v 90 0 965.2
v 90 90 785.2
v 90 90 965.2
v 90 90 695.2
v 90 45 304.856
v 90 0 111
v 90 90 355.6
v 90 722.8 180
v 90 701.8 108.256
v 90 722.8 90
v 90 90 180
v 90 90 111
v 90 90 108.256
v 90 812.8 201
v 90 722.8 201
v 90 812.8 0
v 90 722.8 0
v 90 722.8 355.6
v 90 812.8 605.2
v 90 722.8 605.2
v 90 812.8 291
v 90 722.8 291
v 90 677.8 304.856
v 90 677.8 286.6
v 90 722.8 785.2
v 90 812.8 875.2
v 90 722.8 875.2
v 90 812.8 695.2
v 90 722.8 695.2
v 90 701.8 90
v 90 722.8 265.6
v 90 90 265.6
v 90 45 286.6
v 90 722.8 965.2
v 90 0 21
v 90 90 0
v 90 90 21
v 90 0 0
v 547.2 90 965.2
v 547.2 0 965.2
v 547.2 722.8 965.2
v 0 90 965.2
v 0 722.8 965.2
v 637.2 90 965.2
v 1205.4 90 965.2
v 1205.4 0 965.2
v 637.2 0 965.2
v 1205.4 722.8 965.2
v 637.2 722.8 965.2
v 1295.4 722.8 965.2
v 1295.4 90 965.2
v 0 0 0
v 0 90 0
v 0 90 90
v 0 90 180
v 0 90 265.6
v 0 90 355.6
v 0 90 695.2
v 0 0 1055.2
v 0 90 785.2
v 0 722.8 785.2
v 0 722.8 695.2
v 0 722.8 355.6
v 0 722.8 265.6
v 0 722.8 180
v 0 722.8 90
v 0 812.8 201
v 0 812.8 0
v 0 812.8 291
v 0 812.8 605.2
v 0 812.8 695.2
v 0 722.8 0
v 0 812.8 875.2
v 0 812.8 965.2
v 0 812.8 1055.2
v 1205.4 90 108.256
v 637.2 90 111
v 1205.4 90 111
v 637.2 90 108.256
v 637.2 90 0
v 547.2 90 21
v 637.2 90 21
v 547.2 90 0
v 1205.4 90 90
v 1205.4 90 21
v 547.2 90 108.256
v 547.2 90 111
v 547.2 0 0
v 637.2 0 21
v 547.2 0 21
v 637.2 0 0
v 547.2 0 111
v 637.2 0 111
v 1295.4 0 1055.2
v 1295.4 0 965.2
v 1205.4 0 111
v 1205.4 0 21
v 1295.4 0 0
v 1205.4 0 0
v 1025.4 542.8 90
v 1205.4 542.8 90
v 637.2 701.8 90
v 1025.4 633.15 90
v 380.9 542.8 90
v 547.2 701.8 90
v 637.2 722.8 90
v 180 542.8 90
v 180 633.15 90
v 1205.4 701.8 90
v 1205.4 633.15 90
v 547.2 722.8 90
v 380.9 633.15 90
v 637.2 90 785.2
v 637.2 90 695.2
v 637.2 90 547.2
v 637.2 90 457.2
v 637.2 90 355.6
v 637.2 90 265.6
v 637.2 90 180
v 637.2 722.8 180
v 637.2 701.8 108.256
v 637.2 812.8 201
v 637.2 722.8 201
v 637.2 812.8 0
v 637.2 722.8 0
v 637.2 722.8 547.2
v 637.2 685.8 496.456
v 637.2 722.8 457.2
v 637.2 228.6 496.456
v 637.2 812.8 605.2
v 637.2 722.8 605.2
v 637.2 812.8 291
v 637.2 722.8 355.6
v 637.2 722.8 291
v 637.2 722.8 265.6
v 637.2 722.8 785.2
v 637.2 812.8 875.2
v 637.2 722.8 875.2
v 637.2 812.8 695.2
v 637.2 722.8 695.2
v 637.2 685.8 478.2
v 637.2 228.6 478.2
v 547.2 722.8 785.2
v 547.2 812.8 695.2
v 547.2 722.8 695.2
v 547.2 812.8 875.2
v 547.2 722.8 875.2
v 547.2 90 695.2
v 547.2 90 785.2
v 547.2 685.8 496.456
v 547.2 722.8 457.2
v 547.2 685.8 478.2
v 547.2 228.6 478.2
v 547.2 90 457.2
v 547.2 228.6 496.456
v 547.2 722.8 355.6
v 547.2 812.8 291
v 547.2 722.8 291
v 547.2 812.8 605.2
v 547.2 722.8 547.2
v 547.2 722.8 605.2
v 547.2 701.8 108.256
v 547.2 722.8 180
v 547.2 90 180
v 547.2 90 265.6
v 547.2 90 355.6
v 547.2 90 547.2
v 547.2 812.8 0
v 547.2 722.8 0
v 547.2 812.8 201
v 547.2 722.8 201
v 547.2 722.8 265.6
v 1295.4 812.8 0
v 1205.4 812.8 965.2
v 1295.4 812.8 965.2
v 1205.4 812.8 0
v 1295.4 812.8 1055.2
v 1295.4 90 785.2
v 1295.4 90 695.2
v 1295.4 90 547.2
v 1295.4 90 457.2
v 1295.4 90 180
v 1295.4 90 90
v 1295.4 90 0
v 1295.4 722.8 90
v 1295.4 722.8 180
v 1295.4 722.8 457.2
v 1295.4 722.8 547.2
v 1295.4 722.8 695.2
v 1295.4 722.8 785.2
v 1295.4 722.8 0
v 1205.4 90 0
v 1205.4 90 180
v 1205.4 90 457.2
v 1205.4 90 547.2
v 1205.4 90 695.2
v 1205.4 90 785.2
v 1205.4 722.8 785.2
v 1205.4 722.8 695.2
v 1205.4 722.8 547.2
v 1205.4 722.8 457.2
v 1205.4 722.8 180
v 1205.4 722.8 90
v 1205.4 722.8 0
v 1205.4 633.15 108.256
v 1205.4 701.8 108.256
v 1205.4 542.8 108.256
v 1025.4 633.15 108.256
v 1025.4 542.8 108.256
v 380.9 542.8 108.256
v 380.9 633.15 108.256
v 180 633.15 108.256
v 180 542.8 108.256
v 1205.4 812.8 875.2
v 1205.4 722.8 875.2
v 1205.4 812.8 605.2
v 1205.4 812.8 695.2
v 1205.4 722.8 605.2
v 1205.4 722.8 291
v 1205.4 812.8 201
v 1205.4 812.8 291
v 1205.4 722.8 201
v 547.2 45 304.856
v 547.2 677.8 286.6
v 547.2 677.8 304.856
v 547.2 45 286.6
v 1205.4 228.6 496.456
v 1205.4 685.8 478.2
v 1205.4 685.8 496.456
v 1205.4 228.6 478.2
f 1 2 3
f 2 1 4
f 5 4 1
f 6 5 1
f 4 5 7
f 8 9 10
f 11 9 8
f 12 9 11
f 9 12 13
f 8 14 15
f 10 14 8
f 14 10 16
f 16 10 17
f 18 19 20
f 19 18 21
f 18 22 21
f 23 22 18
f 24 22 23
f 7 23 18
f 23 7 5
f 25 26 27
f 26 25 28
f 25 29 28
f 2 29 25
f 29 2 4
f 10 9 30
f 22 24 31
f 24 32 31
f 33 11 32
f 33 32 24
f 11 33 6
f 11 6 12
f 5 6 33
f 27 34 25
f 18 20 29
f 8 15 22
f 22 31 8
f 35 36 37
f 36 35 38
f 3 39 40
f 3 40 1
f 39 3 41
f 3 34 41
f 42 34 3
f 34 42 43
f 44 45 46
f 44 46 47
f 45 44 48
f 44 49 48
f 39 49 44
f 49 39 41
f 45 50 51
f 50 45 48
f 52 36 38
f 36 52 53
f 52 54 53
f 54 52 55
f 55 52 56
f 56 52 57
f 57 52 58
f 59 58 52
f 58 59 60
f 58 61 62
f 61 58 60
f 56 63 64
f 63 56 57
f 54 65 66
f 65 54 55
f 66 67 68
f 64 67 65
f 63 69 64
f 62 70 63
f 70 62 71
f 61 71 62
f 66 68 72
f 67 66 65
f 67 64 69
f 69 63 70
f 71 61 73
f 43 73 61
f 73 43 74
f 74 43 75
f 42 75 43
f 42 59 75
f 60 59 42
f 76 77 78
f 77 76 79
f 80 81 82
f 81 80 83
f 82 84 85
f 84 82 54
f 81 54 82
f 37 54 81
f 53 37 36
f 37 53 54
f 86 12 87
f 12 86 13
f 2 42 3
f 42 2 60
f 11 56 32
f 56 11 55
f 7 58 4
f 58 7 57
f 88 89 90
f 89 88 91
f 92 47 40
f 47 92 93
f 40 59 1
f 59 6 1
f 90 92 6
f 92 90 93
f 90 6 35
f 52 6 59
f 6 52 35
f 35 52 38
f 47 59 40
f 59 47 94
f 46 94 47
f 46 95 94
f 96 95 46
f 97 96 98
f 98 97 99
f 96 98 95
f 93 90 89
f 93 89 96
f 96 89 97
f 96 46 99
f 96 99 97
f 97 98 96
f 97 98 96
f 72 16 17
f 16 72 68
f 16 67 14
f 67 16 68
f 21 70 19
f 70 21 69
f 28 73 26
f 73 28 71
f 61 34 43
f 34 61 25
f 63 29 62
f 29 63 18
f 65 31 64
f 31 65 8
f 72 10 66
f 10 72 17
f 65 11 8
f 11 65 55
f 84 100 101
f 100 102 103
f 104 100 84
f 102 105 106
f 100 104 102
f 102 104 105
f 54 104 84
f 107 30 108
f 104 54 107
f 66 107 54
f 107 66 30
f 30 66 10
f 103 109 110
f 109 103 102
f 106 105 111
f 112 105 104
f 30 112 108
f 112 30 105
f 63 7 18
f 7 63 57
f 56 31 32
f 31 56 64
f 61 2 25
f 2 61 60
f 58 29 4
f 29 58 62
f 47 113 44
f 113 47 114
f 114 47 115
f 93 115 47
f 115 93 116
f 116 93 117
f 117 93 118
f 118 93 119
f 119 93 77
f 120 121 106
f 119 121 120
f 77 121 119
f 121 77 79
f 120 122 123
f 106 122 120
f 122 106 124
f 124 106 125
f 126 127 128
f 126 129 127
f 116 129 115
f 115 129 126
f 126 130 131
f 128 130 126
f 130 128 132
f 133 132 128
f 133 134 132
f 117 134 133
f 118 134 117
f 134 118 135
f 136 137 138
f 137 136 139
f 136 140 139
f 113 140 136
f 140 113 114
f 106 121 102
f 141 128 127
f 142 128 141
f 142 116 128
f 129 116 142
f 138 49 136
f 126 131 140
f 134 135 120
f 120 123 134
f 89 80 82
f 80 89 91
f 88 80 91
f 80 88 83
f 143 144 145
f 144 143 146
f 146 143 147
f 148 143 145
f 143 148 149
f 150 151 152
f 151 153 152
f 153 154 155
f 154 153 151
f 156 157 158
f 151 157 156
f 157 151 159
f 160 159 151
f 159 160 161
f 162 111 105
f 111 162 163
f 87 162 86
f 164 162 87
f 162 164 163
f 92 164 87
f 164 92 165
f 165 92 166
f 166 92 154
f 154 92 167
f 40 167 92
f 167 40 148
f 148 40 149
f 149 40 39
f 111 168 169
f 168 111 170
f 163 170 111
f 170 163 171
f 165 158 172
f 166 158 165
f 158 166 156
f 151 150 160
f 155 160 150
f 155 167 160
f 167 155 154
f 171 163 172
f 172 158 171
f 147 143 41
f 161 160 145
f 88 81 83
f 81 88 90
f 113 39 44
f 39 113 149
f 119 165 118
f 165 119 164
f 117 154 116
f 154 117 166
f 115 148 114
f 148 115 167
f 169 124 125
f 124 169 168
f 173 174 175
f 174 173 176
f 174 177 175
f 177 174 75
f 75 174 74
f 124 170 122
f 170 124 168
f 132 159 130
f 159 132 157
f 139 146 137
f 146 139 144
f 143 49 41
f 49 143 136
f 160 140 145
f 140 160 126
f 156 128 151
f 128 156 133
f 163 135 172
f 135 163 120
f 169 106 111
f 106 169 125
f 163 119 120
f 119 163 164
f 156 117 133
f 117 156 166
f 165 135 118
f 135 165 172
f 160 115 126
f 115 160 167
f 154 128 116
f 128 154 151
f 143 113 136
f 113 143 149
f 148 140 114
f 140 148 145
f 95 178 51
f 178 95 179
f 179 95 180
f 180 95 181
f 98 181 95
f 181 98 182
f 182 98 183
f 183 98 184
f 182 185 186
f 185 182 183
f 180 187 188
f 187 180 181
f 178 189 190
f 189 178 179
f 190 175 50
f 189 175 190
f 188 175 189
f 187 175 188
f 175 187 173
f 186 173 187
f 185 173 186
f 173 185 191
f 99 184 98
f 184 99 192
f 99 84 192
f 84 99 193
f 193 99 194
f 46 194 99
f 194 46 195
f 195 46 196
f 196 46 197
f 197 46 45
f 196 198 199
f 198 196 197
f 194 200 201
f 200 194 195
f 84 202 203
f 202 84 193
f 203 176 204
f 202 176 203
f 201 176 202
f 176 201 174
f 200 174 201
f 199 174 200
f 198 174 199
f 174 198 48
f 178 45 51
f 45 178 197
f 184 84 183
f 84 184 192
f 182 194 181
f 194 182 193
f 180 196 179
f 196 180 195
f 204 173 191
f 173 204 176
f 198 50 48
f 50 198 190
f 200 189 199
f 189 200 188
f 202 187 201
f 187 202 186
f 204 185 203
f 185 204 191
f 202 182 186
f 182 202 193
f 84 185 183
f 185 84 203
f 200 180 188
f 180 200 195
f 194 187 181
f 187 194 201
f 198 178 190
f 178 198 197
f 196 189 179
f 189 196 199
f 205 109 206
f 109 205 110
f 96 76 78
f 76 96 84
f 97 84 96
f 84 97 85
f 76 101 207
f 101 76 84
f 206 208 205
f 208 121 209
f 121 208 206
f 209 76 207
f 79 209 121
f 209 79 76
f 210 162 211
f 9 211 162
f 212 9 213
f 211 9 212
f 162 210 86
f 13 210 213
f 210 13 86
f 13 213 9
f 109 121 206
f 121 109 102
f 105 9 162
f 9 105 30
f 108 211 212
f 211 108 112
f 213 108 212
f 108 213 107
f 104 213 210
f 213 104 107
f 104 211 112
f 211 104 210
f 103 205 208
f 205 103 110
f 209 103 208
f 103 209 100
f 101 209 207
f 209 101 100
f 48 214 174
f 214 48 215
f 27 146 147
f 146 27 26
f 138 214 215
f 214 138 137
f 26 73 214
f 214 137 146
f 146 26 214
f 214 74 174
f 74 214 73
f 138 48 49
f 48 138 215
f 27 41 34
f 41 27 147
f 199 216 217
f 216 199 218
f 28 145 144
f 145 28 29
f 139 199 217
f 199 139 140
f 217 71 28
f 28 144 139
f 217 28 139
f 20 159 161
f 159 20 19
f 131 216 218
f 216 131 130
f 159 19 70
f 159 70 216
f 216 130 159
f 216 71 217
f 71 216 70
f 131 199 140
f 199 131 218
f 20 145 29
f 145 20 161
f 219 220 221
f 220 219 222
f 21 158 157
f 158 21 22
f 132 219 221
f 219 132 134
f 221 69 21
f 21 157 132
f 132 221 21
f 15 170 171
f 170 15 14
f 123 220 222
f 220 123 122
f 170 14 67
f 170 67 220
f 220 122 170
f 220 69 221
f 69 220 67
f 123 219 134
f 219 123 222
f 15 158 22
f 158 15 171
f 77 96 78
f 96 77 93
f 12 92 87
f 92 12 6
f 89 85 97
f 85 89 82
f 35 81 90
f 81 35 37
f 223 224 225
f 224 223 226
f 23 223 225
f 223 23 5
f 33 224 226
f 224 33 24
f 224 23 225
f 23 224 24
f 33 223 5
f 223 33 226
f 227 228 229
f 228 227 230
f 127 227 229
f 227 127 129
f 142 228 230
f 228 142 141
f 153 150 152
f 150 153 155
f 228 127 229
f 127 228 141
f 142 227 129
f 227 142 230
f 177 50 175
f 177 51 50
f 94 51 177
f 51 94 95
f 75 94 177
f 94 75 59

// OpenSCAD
// file: wood.scad
// PARAMETERS {{{1
// units are in mm 
inch = 25.4;
// base parameters
oneby = 19;
twoby = 21;
fourby = 90;
// plywood thickness
threequarters = 23 / 32 * inch;
onehalf = 15 / 32 * inch;
onequarter = 7 / 32 * inch;
// 1}}}
// MODULES {{{1
// wood definitions {{{2
module onebytwo(length) {
    cube([oneby, length, twoby]);
}
module twobyfour(length) {
    cube([twoby, length, fourby]);
}
module twobytwo(length) {
    cube([twoby, length, twoby]);
}
module fourbyfour(length) {
    cube([fourby, length, fourby]);
}
module plywood3quarters(length, width) {
  cube([length, width, threequarters]);
}
module plywoodhalf(length, width) {
  cube([length, width, onehalf]);
}
module plywoodquarter(length, width) {
  cube([length, width, onequarter]);
}
// 2}}}
// wood working modules
module tenon(width, depth, height) {
    difference() {
        cube([width, depth, height]);
        translate([width/4, depth/4, -1])
        cube([width/2, depth/2, height+2]);
    }
}

module mortise(width, depth, height = twoby) {
  rotate([90, 0, 0])
    union() {
        cube([width, depth, height]);
        translate([width/4, depth/4, height])
        cube([width/2, depth/2, height/2]);
    }
}
// 2}}}
// applied modules
module mortised4x4(length) {
  union() {
    translate([0, fourby, 0])
    fourbyfour(length - fourby * 2);
    // tenon at one end
    translate([fourby - twoby, fourby + twoby, 0])
    mortise(twoby, fourby, fourby);
    // end of fourbyfour
    translate([0, length - fourby, fourby])
    rotate([180, 0, 0])
    mortise(fourby, fourby, fourby);
  }
}
// 1}}}
//
/*mortise(fourby, fourby, fourby);*/
// mortised4x4(23 * inch);
/*tenon2x4x4(13 * inch);*/
/*color("#3434bc")*/
/*translate([0, 0, 100])*/
/*tenon(10, 10, 10);*/
// main file
include <wood.scad>

// table parameters
width = 51 * inch - fourby;
depth = 32 * inch - fourby;
height = 38 * inch;
middle = 18 * inch + fourby;
btm_height = fourby;
laser_printer_height = 14 * inch - fourby;
cricut_height = 18 * inch;

module crossbar(length) {
  cube([length, fourby, fourby]);
}
module leg(length) {
  cube([fourby, fourby, length]);
}
module support(length) {
  cube([fourby, length, fourby]);
}
module tabletop(length, width) {
  cube([length, width, fourby]);
}

module left_frame() {
  union() {
    leg(height);
    translate([0, depth, 0])
    leg(height);
    translate([0, 0, fourby])
    support(depth);
    translate([0, 0, laser_printer_height])
    support(depth);
    translate([0, 0, height - 3 * fourby])
    support(depth);
  }
}

module middle_frame() {
  translate([middle, 0, 0])
  union() {
    leg(height);
    translate([0, depth, 0])
    leg(height);
    translate([0, 0, fourby])
    support(depth);
    translate([0, 0, laser_printer_height])
    support(depth);
    translate([0, 0, cricut_height])
    support(depth);
    translate([0, 0, height - 3 * fourby])
    support(depth);
  }
}

module right_frame() {
  translate([width, 0, 0])
  union() {
    leg(height);
    translate([0, depth, 0])
    leg(height);
    translate([0, 0, fourby])
    support(depth);
    translate([0, 0, cricut_height])
    support(depth);
    translate([0, 0, height - 3 * fourby])
    support(depth);
  }
}

module front_supports() {
  color("green")
  union() {
    translate([0, 0, twoby])
    crossbar(width);
  }
}
module back_supports() {
  color("blue")
  union() {
    translate([0, 0, height - fourby])
    crossbar(width);
    translate([0, 0, height - 4 * fourby])
    crossbar(width);
    translate([0, 0, 2 * fourby + twoby])
    crossbar(width);
  }
}

left_frame();
middle_frame();
right_frame();
// bottom shelf
translate([0, 0, fourby])
  difference() {
  plywood3quarters(width, depth - twoby);
  color("yellow")
  linear_extrude(threequarters) {
    translate([2*fourby, depth - 2 * fourby, 0])
    square([width / 6, depth / 8]);
    translate([width - 2 * fourby, depth - 2 * fourby, 0])
    square([width / 6, depth / 8]);
  }
}
translate([0, depth, 0])
back_supports();
translate([0, 0, 0])
front_supports();
// printer shelf
translate([0, fourby / 2, laser_printer_height + twoby])
plywood3quarters(middle, depth - fourby);
translate([middle, 9 * inch, cricut_height + twoby])
plywood3quarters(width - middle, 18 * inch);
translate([0, 0, height])
tabletop(width + fourby, depth + fourby);
